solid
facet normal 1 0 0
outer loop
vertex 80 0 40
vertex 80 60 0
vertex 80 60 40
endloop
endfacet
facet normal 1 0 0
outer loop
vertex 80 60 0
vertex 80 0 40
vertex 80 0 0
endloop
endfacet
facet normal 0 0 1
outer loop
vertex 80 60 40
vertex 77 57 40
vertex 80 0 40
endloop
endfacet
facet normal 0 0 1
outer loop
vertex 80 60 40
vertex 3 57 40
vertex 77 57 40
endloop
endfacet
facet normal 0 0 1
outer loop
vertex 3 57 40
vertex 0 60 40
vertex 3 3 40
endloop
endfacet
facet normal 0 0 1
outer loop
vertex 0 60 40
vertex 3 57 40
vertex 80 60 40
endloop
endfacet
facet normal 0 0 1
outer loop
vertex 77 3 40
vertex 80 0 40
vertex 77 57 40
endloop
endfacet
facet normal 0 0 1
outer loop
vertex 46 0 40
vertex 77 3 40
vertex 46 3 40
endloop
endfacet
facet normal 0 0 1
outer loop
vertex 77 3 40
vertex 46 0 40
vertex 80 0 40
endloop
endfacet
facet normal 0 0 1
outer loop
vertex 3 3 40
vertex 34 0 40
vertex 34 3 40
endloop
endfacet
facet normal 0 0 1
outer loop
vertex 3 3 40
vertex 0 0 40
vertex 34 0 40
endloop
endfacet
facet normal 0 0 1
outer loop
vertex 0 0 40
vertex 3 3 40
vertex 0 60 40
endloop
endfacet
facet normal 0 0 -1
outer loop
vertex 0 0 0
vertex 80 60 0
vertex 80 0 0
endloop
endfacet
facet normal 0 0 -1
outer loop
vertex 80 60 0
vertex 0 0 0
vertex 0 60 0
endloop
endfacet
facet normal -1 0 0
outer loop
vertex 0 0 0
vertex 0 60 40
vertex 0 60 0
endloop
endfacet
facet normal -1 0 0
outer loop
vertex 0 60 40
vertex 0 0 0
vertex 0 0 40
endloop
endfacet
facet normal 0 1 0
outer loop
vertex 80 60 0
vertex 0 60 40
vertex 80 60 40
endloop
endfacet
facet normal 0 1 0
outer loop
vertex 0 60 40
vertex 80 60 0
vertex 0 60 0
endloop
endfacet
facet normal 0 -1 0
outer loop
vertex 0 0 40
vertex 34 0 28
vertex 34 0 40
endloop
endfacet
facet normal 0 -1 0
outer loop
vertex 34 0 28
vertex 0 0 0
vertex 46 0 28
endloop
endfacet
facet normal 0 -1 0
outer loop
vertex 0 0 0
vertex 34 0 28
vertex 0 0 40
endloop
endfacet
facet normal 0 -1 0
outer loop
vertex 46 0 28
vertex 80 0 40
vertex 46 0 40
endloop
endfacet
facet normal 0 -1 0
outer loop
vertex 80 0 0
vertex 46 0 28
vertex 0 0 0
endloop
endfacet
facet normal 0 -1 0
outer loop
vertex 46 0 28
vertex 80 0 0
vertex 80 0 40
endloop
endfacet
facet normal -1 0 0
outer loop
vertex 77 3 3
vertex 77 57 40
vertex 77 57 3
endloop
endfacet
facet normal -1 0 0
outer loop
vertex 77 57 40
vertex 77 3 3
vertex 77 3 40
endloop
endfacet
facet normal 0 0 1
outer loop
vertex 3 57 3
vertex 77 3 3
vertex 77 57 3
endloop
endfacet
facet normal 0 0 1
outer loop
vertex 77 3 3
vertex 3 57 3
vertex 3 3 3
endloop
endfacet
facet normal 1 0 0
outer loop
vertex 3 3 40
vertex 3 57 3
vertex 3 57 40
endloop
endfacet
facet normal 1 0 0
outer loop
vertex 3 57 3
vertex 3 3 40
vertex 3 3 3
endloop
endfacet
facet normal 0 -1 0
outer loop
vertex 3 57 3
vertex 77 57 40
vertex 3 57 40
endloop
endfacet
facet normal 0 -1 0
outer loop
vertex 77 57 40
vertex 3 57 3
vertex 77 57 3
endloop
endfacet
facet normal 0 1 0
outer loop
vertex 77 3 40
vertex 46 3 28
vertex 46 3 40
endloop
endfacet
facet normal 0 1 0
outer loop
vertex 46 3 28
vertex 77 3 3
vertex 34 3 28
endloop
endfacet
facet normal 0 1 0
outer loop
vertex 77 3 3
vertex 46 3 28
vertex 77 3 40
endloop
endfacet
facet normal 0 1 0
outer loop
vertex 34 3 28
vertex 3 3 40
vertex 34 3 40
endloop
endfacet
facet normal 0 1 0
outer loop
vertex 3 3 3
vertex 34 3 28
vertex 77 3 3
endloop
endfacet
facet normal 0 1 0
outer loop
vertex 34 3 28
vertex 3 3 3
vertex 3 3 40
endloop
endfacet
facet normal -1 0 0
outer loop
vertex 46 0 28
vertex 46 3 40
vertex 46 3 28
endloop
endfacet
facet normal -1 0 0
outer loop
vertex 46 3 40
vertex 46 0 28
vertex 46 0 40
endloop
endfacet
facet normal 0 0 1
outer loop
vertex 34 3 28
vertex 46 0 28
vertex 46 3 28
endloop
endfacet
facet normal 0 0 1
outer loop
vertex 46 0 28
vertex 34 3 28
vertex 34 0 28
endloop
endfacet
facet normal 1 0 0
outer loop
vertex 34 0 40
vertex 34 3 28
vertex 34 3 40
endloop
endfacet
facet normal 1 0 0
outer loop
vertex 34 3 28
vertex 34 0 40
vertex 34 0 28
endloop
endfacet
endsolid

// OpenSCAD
$fn = 32;

// ----------------------------------------------------------------------
// Enclosure box: notch enclosure
// ----------------------------------------------------------------------

// --- parameters (mm) ---
box_l = 80;               // outer length, X
box_w = 60;               // outer width, Y
box_h = 40;               // outer height
wall_t = 3;               // wall thickness
notch_w = 12;             // cable notch width
notch_h = 12;             // cable notch height

inner_h = box_h - wall_t;  // cavity depth
boss_h = inner_h - 2;  // corner boss height

difference() {
  cube([box_l, box_w, box_h]);
  translate([wall_t, wall_t, wall_t])
    cube([box_l - 2 * wall_t, box_w - 2 * wall_t, box_h]);
  translate([box_l / 2 - notch_w / 2, -1, box_h - notch_h])
    cube([notch_w, wall_t + 2, notch_h + 1]);
}
